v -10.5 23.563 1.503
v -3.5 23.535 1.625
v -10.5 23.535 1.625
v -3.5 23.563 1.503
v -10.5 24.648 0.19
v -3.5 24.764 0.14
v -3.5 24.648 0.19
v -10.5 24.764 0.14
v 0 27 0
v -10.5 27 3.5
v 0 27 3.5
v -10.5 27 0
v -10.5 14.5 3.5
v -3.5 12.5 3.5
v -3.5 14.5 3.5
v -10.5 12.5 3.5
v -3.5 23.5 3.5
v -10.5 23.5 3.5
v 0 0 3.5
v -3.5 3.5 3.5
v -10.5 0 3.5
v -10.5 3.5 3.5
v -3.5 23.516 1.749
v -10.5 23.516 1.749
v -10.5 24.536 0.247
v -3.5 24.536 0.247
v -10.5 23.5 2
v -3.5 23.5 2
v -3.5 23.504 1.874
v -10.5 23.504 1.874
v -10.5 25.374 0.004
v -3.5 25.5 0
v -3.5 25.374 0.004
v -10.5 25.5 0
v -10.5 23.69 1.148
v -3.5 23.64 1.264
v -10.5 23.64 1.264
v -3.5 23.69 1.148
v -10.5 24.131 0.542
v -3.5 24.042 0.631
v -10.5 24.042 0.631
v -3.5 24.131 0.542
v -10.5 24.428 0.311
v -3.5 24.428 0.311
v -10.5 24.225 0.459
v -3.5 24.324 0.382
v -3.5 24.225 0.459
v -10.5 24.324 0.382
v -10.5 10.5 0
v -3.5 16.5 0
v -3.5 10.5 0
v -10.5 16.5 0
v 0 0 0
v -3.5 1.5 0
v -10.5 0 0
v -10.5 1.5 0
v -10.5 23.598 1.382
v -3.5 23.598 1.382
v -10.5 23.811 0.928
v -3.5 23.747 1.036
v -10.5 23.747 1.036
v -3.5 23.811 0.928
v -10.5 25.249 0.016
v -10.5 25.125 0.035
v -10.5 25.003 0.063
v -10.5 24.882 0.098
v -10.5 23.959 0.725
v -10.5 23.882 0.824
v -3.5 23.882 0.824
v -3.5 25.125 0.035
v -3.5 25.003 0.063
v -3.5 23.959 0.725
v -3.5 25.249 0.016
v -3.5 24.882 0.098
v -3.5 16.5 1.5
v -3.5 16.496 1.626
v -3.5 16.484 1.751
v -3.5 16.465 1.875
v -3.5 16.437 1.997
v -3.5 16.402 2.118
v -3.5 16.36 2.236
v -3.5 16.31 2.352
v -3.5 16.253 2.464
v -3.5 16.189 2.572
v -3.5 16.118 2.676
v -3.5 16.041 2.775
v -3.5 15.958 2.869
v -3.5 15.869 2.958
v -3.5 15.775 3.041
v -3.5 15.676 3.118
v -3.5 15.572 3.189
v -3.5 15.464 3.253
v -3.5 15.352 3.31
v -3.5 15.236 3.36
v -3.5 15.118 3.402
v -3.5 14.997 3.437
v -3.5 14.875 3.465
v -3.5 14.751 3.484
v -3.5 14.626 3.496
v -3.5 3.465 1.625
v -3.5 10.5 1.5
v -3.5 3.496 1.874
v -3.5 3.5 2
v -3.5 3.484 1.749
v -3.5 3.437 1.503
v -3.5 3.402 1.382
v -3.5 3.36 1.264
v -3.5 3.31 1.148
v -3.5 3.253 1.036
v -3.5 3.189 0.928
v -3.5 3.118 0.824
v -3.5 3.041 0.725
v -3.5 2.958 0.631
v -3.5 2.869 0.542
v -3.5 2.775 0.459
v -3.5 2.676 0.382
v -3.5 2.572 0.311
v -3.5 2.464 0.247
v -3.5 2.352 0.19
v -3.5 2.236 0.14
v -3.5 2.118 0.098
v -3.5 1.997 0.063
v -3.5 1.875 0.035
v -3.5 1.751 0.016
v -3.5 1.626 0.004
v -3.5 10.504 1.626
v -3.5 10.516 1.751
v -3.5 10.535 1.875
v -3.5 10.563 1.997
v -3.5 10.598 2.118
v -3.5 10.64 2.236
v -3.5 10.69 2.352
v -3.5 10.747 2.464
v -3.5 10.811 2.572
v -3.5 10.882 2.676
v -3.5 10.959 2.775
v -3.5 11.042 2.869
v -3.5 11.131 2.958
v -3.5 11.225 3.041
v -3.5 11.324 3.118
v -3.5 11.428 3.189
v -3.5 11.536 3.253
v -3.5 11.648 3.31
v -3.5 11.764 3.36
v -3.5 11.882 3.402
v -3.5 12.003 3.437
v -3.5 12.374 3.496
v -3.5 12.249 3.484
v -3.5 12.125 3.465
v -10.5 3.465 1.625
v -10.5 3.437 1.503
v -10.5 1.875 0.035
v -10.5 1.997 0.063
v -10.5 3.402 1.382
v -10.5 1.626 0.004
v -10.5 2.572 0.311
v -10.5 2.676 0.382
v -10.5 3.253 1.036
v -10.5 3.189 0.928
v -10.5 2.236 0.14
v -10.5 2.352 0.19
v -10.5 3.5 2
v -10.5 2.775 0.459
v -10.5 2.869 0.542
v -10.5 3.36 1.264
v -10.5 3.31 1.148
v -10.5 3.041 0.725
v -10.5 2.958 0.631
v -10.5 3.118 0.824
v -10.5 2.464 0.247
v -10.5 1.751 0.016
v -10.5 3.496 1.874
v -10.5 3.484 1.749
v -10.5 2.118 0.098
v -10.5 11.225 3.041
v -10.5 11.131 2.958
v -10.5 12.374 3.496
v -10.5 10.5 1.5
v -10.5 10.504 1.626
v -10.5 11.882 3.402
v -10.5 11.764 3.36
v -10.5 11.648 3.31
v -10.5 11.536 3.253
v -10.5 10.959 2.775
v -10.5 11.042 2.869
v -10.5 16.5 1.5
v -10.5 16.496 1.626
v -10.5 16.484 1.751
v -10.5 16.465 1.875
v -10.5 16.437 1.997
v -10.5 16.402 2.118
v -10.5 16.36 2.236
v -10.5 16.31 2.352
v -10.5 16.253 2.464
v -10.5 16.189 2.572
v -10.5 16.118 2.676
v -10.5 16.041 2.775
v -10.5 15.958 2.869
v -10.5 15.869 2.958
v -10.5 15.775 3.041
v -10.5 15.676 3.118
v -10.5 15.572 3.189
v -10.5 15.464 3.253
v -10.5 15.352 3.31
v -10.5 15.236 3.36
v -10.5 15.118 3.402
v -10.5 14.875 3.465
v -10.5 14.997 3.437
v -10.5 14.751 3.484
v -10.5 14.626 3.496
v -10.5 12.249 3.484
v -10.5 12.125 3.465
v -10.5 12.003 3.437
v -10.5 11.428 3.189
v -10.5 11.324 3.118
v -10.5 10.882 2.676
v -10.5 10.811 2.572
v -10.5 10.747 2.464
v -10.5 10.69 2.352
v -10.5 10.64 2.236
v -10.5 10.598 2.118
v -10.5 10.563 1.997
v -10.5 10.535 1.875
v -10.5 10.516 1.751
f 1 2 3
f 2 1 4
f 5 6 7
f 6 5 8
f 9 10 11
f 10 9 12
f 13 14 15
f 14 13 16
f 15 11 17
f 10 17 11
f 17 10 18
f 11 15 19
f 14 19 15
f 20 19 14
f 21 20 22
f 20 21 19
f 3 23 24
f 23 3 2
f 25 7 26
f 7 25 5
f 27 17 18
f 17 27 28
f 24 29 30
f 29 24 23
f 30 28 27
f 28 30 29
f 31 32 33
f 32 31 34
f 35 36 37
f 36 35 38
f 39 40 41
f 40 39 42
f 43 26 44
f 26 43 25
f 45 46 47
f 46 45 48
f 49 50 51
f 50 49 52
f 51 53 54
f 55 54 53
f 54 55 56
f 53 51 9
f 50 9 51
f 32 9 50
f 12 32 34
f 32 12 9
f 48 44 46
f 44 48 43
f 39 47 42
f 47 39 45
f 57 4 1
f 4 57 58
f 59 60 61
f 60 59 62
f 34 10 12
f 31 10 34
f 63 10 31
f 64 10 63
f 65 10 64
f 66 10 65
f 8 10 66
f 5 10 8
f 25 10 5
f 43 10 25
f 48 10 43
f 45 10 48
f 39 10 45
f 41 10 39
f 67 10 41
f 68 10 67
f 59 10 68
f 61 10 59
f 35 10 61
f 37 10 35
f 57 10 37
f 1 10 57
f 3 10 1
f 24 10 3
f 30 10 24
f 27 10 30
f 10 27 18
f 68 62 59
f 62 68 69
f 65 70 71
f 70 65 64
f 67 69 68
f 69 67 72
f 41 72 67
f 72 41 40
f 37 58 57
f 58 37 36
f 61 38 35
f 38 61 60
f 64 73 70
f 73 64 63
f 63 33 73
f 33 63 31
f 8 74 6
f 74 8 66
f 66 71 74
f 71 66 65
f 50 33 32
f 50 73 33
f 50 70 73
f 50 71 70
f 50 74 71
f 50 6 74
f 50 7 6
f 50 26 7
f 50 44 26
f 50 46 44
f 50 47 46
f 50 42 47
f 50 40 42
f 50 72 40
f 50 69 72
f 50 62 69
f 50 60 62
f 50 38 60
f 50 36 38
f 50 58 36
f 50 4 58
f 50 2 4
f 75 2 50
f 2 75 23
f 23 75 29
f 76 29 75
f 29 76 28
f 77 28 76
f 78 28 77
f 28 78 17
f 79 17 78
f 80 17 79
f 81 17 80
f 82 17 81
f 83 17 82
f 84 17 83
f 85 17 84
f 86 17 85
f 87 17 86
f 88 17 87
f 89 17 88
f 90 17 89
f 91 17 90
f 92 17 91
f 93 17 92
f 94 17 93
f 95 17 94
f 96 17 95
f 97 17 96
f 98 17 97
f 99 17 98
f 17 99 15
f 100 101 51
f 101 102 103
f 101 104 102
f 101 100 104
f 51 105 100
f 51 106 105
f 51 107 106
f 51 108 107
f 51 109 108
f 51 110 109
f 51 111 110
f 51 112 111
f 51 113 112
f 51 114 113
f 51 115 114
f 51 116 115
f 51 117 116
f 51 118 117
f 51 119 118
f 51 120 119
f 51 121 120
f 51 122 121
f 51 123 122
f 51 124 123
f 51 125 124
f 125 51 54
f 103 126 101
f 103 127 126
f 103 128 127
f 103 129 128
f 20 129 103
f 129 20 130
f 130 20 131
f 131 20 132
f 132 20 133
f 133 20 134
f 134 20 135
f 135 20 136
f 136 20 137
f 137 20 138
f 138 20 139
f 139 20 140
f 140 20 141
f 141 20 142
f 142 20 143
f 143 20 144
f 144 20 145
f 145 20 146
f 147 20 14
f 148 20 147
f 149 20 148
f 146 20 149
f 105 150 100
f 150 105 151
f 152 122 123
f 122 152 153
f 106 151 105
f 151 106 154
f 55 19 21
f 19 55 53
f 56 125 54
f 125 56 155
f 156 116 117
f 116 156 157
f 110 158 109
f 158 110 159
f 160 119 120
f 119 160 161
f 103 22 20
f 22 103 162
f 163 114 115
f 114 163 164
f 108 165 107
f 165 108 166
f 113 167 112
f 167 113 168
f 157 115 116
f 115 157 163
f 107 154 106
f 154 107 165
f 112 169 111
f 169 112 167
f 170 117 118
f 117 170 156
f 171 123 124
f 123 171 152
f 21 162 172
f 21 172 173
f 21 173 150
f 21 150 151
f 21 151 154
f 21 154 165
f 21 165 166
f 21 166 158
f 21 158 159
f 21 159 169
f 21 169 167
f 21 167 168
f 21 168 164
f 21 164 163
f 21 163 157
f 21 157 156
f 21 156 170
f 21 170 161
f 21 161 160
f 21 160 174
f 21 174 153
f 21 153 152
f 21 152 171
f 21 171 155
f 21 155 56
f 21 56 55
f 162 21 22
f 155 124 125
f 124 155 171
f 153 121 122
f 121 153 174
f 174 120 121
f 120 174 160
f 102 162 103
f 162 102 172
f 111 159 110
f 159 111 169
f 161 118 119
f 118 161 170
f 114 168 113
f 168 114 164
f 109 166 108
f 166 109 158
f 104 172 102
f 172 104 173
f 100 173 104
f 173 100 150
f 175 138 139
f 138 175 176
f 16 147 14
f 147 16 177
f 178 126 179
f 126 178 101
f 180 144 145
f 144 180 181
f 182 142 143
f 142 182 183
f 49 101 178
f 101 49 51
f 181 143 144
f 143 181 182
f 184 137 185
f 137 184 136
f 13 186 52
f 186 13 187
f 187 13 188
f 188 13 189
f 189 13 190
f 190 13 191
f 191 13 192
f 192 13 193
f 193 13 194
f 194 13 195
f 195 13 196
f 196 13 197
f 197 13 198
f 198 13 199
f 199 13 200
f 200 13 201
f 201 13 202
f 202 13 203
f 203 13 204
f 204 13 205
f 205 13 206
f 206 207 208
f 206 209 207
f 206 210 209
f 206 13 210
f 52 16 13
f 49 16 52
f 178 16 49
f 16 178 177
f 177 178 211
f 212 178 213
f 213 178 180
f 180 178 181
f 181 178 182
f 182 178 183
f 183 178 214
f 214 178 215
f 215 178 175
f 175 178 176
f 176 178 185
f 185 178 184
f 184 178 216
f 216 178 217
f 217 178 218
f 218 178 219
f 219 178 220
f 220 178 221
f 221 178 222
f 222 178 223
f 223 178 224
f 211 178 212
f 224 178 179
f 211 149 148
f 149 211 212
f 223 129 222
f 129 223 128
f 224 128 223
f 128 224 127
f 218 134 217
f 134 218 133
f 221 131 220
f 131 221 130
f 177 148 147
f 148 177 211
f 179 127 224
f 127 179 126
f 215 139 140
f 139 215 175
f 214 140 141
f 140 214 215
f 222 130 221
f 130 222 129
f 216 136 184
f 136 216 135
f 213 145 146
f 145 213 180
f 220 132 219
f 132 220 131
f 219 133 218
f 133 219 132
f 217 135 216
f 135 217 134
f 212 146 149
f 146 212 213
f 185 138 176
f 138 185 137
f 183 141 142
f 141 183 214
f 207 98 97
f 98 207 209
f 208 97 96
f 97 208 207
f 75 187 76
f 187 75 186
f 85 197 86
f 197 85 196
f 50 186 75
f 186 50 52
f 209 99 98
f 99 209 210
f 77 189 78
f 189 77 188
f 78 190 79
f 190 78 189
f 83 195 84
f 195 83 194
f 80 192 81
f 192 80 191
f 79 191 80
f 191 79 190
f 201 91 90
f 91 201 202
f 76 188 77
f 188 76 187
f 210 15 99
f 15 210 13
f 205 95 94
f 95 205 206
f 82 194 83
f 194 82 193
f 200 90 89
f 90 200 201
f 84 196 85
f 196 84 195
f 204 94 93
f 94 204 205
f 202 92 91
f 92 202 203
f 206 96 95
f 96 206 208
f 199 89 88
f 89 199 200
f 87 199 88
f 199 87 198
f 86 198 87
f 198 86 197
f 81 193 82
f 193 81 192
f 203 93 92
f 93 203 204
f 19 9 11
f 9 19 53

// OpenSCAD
$fn = 100;

BELT_WIDTH = 7;
GAP_WITDH = 7;
TENSION_HEIGHT = 3.5;
SPINE_WIDTH = 3.5;
MIDDLE_SPLINE_WIDTH = 6;
OUTER_SPLINE_WIDTH = 3.5;
SPLINE_RADIUS = 2;

TOTAL_LENGTH =
    OUTER_SPLINE_WIDTH * 2 + GAP_WITDH * 2 + MIDDLE_SPLINE_WIDTH;


module spline (w) {
    linear_extrude (height = BELT_WIDTH) {
        intersection () {
            translate ([SPLINE_RADIUS, SPLINE_RADIUS])
                circle (r=SPLINE_RADIUS);

            square ([SPLINE_RADIUS, SPLINE_RADIUS]);
        }

        difference () {
            square ([w, TENSION_HEIGHT]);
            square ([SPLINE_RADIUS, SPLINE_RADIUS]);
        }
    }
}


rotate ([-90, 0, 90]) translate ([0, -TENSION_HEIGHT, SPINE_WIDTH]) {

translate ([0, TENSION_HEIGHT, 0]) mirror ([0, 1, 0]) {
    // left spline (seen from the open end)
    translate ([TOTAL_LENGTH - OUTER_SPLINE_WIDTH, 0, 0])
        spline (OUTER_SPLINE_WIDTH);


    // right spline (seen from the open end)
    translate ([OUTER_SPLINE_WIDTH, 0, 0])
        mirror ([1, 0, 0])
        spline (OUTER_SPLINE_WIDTH);
}


// middle spline
translate ([SPLINE_RADIUS + OUTER_SPLINE_WIDTH + GAP_WITDH, 0, 0]) {
    translate ([-SPLINE_RADIUS, 0, 0])
        spline (SPLINE_RADIUS + 0.1);

    translate ([0, 0, 0])
        cube (
            [ MIDDLE_SPLINE_WIDTH - SPLINE_RADIUS * 2
            , TENSION_HEIGHT
            , BELT_WIDTH
            ]);

    mirror ([1, 0, 0])
        translate ([-MIDDLE_SPLINE_WIDTH + SPLINE_RADIUS, 0, 0])
        spline (SPLINE_RADIUS + 0.1);
}


// back spine
translate ([0, 0, -SPINE_WIDTH])
    cube (
        [ TOTAL_LENGTH
        , TENSION_HEIGHT
        , SPINE_WIDTH
        ]);

}
